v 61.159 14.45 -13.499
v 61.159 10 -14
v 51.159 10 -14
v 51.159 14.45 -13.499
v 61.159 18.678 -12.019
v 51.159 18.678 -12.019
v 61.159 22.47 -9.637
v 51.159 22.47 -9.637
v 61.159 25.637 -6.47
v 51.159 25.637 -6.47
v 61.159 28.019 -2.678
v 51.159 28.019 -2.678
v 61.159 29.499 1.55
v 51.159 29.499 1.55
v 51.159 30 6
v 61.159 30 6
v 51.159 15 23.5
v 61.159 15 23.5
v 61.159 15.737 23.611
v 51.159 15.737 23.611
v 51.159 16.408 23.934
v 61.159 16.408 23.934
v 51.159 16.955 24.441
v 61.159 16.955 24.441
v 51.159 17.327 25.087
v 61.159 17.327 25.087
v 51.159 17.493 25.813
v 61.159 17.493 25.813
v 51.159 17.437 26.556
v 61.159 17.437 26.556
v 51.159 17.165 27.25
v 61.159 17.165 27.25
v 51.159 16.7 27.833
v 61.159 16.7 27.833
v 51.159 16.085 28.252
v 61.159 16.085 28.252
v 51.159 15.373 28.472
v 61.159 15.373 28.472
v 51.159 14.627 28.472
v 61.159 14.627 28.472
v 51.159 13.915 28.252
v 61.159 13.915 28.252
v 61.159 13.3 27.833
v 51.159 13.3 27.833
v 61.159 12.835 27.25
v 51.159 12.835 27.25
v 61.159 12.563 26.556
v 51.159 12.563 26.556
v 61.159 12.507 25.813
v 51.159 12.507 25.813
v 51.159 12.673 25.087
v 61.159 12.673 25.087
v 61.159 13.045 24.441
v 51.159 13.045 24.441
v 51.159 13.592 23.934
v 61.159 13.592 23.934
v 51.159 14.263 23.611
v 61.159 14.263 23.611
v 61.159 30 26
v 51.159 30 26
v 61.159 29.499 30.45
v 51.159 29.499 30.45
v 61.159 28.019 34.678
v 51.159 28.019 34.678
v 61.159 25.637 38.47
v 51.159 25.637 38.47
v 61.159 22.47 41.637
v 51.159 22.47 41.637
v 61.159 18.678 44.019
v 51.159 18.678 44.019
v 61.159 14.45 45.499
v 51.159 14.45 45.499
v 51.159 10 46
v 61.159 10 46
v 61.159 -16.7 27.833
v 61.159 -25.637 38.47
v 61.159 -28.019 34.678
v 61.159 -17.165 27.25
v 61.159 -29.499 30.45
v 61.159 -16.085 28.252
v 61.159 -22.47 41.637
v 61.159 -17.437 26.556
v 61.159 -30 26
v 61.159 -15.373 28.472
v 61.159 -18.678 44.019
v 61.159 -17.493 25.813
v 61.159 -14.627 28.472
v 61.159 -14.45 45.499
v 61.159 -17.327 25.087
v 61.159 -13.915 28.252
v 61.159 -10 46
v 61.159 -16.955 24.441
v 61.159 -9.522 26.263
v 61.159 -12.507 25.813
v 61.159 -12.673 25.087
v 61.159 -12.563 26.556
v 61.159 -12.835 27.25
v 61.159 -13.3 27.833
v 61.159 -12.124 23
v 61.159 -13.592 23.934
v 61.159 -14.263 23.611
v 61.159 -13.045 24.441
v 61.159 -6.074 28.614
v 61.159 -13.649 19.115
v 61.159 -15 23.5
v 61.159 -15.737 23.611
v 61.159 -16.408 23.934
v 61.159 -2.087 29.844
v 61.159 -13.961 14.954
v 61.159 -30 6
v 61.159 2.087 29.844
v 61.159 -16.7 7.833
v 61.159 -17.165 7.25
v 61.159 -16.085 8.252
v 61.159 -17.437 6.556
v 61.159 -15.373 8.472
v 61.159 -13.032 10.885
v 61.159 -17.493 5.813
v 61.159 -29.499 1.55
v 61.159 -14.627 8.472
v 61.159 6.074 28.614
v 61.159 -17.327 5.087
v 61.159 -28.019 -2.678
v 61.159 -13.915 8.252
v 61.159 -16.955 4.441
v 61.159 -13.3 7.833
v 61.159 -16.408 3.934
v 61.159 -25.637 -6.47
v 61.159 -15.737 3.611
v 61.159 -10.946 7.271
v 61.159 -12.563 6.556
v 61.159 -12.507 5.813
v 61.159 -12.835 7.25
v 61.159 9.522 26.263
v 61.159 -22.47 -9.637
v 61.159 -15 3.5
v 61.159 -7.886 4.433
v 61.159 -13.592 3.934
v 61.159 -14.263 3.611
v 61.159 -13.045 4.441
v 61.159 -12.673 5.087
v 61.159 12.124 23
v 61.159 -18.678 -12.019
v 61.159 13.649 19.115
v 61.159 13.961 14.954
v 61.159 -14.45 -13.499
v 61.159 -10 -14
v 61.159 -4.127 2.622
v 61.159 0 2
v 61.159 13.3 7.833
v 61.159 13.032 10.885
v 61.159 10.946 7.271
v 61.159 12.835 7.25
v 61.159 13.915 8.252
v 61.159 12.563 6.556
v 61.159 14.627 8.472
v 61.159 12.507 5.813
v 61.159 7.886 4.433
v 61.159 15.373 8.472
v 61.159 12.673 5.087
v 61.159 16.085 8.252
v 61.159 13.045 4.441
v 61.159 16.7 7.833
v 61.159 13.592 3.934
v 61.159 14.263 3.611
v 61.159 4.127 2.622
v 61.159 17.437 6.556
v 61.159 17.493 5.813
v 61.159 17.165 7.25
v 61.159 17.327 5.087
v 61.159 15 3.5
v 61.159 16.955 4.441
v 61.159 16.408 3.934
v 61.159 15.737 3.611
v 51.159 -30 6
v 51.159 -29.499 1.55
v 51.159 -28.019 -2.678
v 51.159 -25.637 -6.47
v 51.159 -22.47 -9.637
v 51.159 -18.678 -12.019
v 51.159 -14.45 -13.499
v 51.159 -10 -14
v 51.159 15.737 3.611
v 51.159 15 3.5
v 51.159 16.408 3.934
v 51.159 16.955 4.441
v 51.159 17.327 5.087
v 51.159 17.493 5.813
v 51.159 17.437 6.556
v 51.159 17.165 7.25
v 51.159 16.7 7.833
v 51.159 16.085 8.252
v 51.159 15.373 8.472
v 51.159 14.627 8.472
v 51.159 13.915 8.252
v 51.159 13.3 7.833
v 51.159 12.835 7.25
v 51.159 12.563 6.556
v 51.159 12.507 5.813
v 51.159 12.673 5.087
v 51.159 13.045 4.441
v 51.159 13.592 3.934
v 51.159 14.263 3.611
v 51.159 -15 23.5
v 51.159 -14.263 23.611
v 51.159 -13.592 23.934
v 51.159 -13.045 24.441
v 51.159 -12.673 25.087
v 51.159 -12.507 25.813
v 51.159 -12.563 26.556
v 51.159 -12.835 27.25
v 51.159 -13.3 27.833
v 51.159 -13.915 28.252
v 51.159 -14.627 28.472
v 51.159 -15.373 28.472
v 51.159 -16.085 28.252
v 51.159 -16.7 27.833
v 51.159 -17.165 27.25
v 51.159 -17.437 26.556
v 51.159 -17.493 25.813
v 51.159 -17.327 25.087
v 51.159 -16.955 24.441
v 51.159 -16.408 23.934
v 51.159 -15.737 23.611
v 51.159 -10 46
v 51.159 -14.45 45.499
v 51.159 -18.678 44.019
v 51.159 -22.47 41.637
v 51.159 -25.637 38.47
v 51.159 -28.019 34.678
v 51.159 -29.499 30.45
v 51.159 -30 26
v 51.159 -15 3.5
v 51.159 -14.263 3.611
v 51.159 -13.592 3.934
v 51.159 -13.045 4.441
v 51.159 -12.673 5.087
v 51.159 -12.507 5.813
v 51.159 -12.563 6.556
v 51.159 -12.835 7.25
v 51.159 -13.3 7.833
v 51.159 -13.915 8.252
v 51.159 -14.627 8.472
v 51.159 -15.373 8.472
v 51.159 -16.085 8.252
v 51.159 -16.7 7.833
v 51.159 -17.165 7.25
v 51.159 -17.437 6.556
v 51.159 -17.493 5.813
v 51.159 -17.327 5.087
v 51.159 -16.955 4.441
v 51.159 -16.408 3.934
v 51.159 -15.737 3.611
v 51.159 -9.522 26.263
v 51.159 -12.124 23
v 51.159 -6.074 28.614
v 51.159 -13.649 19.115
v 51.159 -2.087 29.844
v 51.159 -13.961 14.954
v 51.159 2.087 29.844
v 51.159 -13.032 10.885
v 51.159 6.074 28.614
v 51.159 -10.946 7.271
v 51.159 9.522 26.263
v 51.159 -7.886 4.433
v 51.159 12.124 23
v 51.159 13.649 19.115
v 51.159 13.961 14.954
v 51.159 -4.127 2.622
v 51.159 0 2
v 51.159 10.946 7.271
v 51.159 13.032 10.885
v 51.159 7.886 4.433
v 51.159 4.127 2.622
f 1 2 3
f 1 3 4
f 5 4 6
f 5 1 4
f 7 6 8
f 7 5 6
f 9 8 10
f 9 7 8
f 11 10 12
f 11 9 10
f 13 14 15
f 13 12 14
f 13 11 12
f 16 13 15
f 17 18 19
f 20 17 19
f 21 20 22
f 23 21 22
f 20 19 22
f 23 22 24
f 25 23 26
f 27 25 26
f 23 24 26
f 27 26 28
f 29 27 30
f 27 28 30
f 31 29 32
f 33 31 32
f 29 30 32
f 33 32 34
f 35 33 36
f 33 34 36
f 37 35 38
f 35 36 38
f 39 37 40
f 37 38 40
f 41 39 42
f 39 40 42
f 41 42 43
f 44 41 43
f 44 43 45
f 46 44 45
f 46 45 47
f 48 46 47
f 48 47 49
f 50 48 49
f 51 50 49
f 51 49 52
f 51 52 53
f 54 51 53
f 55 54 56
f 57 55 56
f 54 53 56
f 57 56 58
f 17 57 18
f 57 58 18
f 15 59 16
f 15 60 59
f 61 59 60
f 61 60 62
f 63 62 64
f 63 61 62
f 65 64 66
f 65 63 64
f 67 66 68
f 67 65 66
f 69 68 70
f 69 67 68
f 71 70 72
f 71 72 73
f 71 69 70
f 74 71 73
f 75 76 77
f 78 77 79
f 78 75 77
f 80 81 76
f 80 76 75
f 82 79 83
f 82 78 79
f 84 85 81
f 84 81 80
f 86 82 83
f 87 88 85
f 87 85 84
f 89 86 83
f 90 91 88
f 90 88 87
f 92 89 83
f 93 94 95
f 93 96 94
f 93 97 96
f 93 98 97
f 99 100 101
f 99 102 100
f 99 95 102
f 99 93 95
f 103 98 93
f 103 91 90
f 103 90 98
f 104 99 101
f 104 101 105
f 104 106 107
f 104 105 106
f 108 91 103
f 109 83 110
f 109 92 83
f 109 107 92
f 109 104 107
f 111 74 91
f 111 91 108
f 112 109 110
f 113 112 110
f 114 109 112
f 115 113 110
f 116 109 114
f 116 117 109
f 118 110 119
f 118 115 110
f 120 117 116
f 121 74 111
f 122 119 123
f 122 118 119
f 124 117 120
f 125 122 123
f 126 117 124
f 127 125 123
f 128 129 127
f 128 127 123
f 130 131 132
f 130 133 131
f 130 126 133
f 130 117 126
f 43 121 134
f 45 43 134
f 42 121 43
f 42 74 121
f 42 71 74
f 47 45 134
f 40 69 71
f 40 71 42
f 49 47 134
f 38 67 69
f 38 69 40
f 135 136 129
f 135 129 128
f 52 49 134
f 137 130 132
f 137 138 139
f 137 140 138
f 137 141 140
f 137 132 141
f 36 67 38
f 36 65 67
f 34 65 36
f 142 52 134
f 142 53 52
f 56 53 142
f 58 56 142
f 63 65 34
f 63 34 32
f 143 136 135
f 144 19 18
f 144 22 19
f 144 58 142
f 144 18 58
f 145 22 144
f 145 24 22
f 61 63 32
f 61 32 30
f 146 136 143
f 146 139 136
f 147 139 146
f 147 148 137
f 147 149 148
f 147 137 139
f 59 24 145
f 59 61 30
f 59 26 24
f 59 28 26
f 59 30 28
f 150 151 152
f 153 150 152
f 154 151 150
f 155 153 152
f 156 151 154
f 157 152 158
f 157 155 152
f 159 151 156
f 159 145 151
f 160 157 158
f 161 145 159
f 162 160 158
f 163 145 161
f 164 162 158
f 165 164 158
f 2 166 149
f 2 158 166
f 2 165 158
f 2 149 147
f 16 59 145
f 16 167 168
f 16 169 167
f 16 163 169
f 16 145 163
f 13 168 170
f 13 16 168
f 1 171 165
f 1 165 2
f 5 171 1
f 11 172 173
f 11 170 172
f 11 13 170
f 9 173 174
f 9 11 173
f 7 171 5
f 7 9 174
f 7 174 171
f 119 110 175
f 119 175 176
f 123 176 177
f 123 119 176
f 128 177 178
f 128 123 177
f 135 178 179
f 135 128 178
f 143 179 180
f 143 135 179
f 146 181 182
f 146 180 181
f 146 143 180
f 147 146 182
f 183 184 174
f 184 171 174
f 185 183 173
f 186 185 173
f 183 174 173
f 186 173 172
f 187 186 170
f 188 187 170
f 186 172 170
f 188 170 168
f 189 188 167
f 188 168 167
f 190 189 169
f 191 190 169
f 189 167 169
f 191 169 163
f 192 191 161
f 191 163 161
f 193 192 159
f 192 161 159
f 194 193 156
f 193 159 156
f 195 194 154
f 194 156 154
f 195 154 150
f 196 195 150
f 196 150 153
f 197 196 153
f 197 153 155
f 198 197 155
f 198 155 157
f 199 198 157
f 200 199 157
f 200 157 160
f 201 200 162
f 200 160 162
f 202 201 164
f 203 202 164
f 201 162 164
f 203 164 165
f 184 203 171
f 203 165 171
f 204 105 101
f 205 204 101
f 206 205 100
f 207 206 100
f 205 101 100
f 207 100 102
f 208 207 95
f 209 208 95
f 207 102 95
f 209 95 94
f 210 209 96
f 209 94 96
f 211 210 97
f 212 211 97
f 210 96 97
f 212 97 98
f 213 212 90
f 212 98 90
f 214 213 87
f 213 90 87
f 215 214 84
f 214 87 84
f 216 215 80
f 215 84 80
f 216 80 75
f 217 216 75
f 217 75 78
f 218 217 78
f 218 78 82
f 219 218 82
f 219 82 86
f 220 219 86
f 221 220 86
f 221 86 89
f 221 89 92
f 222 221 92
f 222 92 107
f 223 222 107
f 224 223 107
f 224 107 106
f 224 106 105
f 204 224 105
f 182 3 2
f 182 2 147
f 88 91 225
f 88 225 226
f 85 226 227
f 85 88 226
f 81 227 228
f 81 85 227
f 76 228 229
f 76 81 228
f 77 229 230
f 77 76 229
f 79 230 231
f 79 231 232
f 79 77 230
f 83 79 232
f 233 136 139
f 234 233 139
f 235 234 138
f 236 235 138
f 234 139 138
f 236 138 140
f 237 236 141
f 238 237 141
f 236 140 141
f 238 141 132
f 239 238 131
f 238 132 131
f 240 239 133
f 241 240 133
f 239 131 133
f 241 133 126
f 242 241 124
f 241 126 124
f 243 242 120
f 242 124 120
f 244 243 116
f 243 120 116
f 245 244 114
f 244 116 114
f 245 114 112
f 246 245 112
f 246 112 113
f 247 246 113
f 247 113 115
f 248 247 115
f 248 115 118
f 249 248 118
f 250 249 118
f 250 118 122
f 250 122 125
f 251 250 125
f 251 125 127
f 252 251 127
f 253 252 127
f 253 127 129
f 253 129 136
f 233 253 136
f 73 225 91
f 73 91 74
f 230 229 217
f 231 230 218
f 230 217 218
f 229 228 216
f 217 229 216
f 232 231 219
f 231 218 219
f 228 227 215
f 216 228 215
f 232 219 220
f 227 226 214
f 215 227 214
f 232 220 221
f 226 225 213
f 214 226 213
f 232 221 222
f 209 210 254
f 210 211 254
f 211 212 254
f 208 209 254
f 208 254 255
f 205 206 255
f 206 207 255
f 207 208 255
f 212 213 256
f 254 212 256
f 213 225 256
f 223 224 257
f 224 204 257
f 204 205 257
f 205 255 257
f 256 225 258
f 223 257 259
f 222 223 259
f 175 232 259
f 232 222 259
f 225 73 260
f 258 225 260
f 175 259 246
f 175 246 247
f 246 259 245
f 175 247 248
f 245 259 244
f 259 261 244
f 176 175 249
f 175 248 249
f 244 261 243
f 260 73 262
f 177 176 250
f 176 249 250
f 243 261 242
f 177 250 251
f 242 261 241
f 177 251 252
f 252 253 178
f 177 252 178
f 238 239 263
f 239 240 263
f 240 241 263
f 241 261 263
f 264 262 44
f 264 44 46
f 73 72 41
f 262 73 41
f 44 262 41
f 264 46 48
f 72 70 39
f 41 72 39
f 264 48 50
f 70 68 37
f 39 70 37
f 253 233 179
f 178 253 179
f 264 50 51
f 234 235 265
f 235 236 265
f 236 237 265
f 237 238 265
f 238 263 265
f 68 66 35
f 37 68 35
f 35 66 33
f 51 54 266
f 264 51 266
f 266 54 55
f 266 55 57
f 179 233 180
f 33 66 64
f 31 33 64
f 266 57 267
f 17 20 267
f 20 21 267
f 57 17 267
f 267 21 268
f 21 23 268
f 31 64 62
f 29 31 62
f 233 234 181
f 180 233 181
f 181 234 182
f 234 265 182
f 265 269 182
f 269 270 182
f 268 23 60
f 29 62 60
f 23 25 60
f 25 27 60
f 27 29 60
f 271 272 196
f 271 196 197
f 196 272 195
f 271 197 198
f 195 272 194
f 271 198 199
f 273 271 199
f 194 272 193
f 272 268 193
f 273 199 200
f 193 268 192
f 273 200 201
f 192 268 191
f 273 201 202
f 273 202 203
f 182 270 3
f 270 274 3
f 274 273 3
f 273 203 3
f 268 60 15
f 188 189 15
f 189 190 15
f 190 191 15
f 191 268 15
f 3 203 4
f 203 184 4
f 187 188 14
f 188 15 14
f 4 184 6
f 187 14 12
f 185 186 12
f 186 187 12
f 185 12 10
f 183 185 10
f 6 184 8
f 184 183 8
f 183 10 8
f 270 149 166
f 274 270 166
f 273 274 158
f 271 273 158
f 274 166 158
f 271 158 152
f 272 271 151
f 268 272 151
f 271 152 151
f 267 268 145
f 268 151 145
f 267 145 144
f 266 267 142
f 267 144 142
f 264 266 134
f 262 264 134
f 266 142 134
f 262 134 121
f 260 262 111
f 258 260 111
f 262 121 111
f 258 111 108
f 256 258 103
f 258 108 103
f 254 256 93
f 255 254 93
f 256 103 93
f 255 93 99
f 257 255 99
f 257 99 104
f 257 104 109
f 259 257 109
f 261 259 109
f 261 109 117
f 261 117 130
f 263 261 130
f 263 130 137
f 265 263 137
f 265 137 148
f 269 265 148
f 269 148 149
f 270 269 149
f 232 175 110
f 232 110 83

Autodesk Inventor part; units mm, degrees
ref_plane "YZ Plane" through (0, 0, 0) normal (1, 0, 0) x (0, 1, 0)
ref_plane "XZ Plane" through (0, 0, 0) normal (0, 1, 0) x (-1, 0, 0)
sketch "Sketch1" plane through (0, 0, 0) normal (0, 0, 1) x (1, 0, 0)
  circle A0 centre (0, 0) radius 47.5
  circle A1 centre (0, 0) radius 4.25
  circle A2 centre (25, 0) radius 2.5
  circle A3 centre (12.5, 21.6506) radius 2.5
  circle A4 centre (-12.5, 21.6506) radius 2.5
  circle A5 centre (-25, 0) radius 2.5
  circle A6 centre (-12.5, -21.6506) radius 2.5
  circle A7 centre (12.5, -21.6506) radius 2.5
  dimension "d0" = 95
  dimension "d1" = 8.5
  dimension "d2" = 5
  dimension "d3" = 25
  dimension "d6" = 360
extrude "Extrusion1" add sketch "Sketch1" along normal blind 54
ref_plane "Work Plane1" through (0, 0, 16) normal (0, 0, 1) x (1, 0, 0)
sketch "Sketch2" plane through (0, 0, 16) normal (0, 0, 1) x (1, 0, 0)
  circle A0 centre (0, 0) radius 47.5 projected
  line L0 (44.1588, 17.5) -> (51.1588, 17.5)
  line L1 (51.1588, 17.5) -> (51.1588, -17.5)
  line L2 (51.1588, -17.5) -> (44.1588, -17.5)
  line L3 (44.1588, -17.5) -> (44.1588, 17.5)
  point P0 (44.1588, 0)
  dimension "d11" = 7
  dimension "d12" = 35
extrude "Extrusion2" add sketch "Sketch2" along normal mid plane 25 contours A0 L0 L1 L2
sketch "Sketch3" plane through (51.1588, -17.5, 28.5) normal (1, 0, 0) x (0, 0, -1)
  line L0 (-17.5, 47.5) -> (42.5, 47.5)
  line L1 (42.5, 47.5) -> (42.5, -12.5)
  line L2 (42.5, -12.5) -> (-17.5, -12.5)
  line L3 (-17.5, -12.5) -> (-17.5, 47.5)
  line L4 (25, 35) -> (0, 35) projected
  line L5 (0, 0) -> (0, 35) projected
  line L6 (25, 0) -> (0, 0) projected
  line L7 (25, 35) -> (25, 0) projected
  line L8 (25, 35) -> (25, 0) projected
  point P0 (28.5, 17.5)
  point P1 (-17.5, 17.5)
  point P2 (25, 17.5)
  point P3 (12.5, 47.5)
  point P4 (12.5, 35)
  dimension "d15" = 60
  dimension "d16" = 60
extrude "Extrusion3" add sketch "Sketch3" along normal blind 10 contours L0 L1 L2 L3 | L7 L6 L5 L4
fillet "Fillet1" radius 20 4 edges at (56.1588, 30, 46) (56.1588, 30, -14) (56.1588, -30, -14) (56.1588, -30, 46)
sketch "Sketch4" plane through (61.1588, -17.5, 28.5) normal (1, 0, 0) x (0, 0, -1)
  line L0 (2.5, 32.5) -> (22.5, 32.5) construction
  line L1 (22.5, 32.5) -> (22.5, 2.5) construction
  line L2 (22.5, 2.5) -> (2.5, 2.5) construction
  line L3 (2.5, 2.5) -> (2.5, 32.5) construction
  line L4 (22.5, 47.5) -> (2.5, 47.5) projected
  line L5 (42.5, 7.5) -> (42.5, 27.5) projected
  circle A0 centre (2.5, 32.5) radius 2.5
  circle A1 centre (22.5, 32.5) radius 2.5
  circle A2 centre (2.5, 2.5) radius 2.5
  circle A3 centre (22.5, 2.5) radius 2.5
  point P0 (28.5, 17.5)
  point P1 (22.5, 17.5)
  point P2 (42.5, 17.5)
  point P3 (12.5, 32.5)
  point P4 (12.5, 47.5)
  dimension "d20" = 20
  dimension "d21" = 30
  dimension "d22" = 5
  dimension "d23" = 5
  dimension "d24" = 5
  dimension "d25" = 5
extrude "Extrusion4" cut sketch "Sketch4" against normal blind 30
sketch "Sketch5" plane through (61.1588, -17.5, 28.5) normal (1, 0, 0) x (0, 0, -1)
  circle A0 centre (12.5, 17.5) radius 14
  line L0 (42.5, 7.5) -> (42.5, 27.5) projected
  line L1 (2.5, -12.5) -> (22.5, -12.5) projected
  point P0 (28.5, 17.5)
  point P1 (12.5, -12.5)
  point P2 (42.5, 17.5)
  dimension "d28" = 28
extrude "Extrusion5" cut sketch "Sketch5" against normal blind 13
sketch "Sketch6" plane through (0, 0, 54) normal (0, 0, 1) x (1, 0, 0)
  circle A0 centre (0, 0) radius 47.5 projected
extrude "Extrusion6" cut sketch "Sketch6" against normal blind 10
sketch "Sketch7" plane through (0, 0, 44) normal (0, 0, 1) x (1, 0, 0)
  circle A0 centre (0, 0) radius 47.5 projected
  circle A1 centre (0, 0) radius 42.5
  circle A2 centre (0, 0) radius 17.5
  dimension "d33" = 5
  dimension "d34" = 35
extrude "Extrusion7" cut sketch "Sketch7" against normal blind 15 contours A1
sketch "Sketch8" plane through (0, 0, 44) normal (0, 0, 1) x (1, 0, 0)
  circle A0 centre (0, 0) radius 13.5
  dimension "d37" = 27
extrude "Extrusion8" cut sketch "Sketch8" against normal blind 10
sketch "Sketch9" plane through (0, 0, 34) normal (0, 0, 1) x (1, 0, 0)
  circle A0 centre (0, 9.525) radius 1.5
  circle A1 centre (-8.2489, 4.7625) radius 1.5
  circle A2 centre (-8.2489, -4.7625) radius 1.5
  circle A3 centre (0, -9.525) radius 1.5
  circle A4 centre (8.2489, -4.7625) radius 1.5
  circle A5 centre (8.2489, 4.7625) radius 1.5
  point P0 (0, 0)
  dimension "d40" = 3
  dimension "d41" = 9.525
  dimension "d44" = 360
extrude "Extrusion9" cut sketch "Sketch9" against normal blind 15
sketch "Sketch10" plane through (0, 0, 0) normal (1, 0, 0) x (0, 1, 0)
  line L0 (-13.5, 34) -> (13.5, 34) projected
  line L1 (-13.5, 44) -> (13.5, 44) projected
  circle A0 centre (0, 36.75) radius 1.5
  circle A1 centre (0, 41.85) radius 1.5
  line L2 (0, 38.25) -> (0, 40.35)
  line L3 (-13.5, 34) -> (13.5, 34) projected
  line L4 (0, 34) -> (0, 35.25)
  point P0 (0, 0)
  dimension "d49" = 3
  dimension "d48" = 3
  dimension "d50" = 2.1
  dimension "d52" = 1.25
extrude "Extrusion10" cut sketch "Sketch10" against normal through all
sketch "Sketch11" plane through (51.1588, -17.5, 28.5) normal (-1, 0, 0) x (0, 0, 1)
  line L0 (-80.8261, -70.2881) -> (37.6957, -70.2881)
  line L1 (37.6957, -70.2881) -> (37.6957, 87.9511)
  line L2 (37.6957, 87.9511) -> (-80.8261, 87.9511)
  line L3 (-80.8261, 87.9511) -> (-80.8261, -70.2881)
  point P0 (-28.5, 17.5)
extrude "Extrusion11" cut sketch "Sketch11" along normal through all
equation "\"d26\" = d21"
properties part number "AA036" material "ABS Plastic"
